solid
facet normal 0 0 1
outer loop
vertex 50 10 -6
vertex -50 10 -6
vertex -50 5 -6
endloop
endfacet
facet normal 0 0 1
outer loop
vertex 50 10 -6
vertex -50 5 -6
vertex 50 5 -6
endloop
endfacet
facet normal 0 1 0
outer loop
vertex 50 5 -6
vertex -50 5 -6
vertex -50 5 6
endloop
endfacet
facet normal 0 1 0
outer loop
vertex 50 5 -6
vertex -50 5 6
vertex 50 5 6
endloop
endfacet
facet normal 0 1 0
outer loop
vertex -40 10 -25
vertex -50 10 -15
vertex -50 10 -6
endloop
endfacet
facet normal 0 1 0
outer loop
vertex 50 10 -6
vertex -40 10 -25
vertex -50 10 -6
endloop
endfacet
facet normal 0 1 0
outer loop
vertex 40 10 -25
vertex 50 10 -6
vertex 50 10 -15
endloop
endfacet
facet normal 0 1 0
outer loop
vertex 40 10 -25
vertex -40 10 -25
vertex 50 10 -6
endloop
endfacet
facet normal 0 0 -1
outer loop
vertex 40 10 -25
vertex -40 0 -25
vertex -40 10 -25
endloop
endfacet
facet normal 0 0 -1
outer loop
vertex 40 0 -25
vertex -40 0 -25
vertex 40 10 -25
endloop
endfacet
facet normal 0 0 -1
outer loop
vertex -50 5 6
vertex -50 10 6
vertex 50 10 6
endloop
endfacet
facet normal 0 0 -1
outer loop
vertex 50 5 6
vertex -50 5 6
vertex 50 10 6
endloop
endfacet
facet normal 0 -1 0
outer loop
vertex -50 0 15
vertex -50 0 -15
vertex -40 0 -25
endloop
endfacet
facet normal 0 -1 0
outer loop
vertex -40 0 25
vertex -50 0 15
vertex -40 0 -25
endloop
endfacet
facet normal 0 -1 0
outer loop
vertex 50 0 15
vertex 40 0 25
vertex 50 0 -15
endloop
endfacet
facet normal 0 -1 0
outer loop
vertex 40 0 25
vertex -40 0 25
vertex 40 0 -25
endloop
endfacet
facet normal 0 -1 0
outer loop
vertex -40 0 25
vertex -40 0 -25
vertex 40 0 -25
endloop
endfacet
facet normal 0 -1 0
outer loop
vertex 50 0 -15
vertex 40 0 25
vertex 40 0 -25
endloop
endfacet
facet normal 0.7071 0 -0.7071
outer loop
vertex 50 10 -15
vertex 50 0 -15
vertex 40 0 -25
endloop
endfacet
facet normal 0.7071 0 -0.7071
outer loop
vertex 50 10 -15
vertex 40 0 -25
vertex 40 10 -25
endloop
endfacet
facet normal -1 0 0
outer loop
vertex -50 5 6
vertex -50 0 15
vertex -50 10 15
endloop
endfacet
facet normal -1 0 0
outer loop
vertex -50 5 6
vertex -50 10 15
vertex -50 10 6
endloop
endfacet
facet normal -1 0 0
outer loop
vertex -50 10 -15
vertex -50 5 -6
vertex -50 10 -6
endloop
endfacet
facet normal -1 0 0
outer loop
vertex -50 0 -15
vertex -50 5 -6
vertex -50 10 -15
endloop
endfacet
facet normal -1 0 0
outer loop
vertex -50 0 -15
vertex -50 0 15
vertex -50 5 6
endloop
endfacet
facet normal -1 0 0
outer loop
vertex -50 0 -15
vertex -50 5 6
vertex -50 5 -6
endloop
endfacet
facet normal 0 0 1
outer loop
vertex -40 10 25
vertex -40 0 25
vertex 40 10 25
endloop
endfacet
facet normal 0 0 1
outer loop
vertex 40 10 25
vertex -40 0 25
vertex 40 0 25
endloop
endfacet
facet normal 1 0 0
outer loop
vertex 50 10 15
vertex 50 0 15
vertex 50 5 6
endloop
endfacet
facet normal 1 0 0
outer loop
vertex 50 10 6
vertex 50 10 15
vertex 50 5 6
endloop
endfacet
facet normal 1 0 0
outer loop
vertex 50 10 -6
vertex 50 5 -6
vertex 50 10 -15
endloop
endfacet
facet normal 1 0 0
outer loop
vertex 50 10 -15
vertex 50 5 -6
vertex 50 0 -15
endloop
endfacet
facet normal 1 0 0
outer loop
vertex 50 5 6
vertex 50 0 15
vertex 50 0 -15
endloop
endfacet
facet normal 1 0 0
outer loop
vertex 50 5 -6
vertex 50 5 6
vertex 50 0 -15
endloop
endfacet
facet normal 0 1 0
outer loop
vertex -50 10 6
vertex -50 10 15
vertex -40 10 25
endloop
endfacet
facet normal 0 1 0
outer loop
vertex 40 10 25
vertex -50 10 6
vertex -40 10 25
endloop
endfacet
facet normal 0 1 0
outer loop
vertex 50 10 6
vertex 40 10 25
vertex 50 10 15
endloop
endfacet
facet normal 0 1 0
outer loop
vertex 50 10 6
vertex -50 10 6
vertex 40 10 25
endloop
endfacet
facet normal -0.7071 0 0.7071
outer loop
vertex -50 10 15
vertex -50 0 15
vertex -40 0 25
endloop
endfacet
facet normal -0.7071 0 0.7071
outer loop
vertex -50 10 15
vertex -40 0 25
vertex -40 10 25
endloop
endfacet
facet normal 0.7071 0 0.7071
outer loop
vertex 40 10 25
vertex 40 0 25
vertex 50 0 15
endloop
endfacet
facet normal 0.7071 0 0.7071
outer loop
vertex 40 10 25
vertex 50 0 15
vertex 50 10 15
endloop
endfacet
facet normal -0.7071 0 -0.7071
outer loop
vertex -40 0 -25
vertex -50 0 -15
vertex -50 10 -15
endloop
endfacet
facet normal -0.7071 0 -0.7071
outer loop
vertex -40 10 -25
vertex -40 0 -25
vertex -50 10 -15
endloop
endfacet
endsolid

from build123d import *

# Parameters (mm, degrees)
SKETCH1_W           = 100
SKETCH1_H           = 50
BOSS_EXTRUDE1_DEPTH = 10
CHAMFER1_SIZE       = 10
SKETCH2_W           = 113.165724781
SKETCH2_H           = 12
CUT_EXTRUDE1_DEPTH  = 5


with BuildPart() as part:
    # Sketch1 → Boss-Extrude1 (new body)
    with BuildSketch(Plane(origin=(0, 0, 0), x_dir=(1, 0, 0), z_dir=(0, 1, 0))):
        Rectangle(SKETCH1_W, SKETCH1_H)
    extrude(amount=BOSS_EXTRUDE1_DEPTH)

    # Chamfer1
    chamfer1_edges = [part.edges().sort_by_distance(p)[0] for p in [
        (-50, 5, -25),
        (50, 5, -25),
        (50, 5, 25),
        (-50, 5, 25),
    ]]
    chamfer(chamfer1_edges, length=CHAMFER1_SIZE)

    # Sketch2 → Cut-Extrude1 (cut)
    with BuildSketch(Plane(origin=(0, 10, 0), x_dir=(1, 0, 0), z_dir=(0, 1, 0))):
        with Locations((-1.797960114, 0)):
            Rectangle(SKETCH2_W, SKETCH2_H)
    extrude(amount=-CUT_EXTRUDE1_DEPTH, mode=Mode.SUBTRACT)


solid = part.part
